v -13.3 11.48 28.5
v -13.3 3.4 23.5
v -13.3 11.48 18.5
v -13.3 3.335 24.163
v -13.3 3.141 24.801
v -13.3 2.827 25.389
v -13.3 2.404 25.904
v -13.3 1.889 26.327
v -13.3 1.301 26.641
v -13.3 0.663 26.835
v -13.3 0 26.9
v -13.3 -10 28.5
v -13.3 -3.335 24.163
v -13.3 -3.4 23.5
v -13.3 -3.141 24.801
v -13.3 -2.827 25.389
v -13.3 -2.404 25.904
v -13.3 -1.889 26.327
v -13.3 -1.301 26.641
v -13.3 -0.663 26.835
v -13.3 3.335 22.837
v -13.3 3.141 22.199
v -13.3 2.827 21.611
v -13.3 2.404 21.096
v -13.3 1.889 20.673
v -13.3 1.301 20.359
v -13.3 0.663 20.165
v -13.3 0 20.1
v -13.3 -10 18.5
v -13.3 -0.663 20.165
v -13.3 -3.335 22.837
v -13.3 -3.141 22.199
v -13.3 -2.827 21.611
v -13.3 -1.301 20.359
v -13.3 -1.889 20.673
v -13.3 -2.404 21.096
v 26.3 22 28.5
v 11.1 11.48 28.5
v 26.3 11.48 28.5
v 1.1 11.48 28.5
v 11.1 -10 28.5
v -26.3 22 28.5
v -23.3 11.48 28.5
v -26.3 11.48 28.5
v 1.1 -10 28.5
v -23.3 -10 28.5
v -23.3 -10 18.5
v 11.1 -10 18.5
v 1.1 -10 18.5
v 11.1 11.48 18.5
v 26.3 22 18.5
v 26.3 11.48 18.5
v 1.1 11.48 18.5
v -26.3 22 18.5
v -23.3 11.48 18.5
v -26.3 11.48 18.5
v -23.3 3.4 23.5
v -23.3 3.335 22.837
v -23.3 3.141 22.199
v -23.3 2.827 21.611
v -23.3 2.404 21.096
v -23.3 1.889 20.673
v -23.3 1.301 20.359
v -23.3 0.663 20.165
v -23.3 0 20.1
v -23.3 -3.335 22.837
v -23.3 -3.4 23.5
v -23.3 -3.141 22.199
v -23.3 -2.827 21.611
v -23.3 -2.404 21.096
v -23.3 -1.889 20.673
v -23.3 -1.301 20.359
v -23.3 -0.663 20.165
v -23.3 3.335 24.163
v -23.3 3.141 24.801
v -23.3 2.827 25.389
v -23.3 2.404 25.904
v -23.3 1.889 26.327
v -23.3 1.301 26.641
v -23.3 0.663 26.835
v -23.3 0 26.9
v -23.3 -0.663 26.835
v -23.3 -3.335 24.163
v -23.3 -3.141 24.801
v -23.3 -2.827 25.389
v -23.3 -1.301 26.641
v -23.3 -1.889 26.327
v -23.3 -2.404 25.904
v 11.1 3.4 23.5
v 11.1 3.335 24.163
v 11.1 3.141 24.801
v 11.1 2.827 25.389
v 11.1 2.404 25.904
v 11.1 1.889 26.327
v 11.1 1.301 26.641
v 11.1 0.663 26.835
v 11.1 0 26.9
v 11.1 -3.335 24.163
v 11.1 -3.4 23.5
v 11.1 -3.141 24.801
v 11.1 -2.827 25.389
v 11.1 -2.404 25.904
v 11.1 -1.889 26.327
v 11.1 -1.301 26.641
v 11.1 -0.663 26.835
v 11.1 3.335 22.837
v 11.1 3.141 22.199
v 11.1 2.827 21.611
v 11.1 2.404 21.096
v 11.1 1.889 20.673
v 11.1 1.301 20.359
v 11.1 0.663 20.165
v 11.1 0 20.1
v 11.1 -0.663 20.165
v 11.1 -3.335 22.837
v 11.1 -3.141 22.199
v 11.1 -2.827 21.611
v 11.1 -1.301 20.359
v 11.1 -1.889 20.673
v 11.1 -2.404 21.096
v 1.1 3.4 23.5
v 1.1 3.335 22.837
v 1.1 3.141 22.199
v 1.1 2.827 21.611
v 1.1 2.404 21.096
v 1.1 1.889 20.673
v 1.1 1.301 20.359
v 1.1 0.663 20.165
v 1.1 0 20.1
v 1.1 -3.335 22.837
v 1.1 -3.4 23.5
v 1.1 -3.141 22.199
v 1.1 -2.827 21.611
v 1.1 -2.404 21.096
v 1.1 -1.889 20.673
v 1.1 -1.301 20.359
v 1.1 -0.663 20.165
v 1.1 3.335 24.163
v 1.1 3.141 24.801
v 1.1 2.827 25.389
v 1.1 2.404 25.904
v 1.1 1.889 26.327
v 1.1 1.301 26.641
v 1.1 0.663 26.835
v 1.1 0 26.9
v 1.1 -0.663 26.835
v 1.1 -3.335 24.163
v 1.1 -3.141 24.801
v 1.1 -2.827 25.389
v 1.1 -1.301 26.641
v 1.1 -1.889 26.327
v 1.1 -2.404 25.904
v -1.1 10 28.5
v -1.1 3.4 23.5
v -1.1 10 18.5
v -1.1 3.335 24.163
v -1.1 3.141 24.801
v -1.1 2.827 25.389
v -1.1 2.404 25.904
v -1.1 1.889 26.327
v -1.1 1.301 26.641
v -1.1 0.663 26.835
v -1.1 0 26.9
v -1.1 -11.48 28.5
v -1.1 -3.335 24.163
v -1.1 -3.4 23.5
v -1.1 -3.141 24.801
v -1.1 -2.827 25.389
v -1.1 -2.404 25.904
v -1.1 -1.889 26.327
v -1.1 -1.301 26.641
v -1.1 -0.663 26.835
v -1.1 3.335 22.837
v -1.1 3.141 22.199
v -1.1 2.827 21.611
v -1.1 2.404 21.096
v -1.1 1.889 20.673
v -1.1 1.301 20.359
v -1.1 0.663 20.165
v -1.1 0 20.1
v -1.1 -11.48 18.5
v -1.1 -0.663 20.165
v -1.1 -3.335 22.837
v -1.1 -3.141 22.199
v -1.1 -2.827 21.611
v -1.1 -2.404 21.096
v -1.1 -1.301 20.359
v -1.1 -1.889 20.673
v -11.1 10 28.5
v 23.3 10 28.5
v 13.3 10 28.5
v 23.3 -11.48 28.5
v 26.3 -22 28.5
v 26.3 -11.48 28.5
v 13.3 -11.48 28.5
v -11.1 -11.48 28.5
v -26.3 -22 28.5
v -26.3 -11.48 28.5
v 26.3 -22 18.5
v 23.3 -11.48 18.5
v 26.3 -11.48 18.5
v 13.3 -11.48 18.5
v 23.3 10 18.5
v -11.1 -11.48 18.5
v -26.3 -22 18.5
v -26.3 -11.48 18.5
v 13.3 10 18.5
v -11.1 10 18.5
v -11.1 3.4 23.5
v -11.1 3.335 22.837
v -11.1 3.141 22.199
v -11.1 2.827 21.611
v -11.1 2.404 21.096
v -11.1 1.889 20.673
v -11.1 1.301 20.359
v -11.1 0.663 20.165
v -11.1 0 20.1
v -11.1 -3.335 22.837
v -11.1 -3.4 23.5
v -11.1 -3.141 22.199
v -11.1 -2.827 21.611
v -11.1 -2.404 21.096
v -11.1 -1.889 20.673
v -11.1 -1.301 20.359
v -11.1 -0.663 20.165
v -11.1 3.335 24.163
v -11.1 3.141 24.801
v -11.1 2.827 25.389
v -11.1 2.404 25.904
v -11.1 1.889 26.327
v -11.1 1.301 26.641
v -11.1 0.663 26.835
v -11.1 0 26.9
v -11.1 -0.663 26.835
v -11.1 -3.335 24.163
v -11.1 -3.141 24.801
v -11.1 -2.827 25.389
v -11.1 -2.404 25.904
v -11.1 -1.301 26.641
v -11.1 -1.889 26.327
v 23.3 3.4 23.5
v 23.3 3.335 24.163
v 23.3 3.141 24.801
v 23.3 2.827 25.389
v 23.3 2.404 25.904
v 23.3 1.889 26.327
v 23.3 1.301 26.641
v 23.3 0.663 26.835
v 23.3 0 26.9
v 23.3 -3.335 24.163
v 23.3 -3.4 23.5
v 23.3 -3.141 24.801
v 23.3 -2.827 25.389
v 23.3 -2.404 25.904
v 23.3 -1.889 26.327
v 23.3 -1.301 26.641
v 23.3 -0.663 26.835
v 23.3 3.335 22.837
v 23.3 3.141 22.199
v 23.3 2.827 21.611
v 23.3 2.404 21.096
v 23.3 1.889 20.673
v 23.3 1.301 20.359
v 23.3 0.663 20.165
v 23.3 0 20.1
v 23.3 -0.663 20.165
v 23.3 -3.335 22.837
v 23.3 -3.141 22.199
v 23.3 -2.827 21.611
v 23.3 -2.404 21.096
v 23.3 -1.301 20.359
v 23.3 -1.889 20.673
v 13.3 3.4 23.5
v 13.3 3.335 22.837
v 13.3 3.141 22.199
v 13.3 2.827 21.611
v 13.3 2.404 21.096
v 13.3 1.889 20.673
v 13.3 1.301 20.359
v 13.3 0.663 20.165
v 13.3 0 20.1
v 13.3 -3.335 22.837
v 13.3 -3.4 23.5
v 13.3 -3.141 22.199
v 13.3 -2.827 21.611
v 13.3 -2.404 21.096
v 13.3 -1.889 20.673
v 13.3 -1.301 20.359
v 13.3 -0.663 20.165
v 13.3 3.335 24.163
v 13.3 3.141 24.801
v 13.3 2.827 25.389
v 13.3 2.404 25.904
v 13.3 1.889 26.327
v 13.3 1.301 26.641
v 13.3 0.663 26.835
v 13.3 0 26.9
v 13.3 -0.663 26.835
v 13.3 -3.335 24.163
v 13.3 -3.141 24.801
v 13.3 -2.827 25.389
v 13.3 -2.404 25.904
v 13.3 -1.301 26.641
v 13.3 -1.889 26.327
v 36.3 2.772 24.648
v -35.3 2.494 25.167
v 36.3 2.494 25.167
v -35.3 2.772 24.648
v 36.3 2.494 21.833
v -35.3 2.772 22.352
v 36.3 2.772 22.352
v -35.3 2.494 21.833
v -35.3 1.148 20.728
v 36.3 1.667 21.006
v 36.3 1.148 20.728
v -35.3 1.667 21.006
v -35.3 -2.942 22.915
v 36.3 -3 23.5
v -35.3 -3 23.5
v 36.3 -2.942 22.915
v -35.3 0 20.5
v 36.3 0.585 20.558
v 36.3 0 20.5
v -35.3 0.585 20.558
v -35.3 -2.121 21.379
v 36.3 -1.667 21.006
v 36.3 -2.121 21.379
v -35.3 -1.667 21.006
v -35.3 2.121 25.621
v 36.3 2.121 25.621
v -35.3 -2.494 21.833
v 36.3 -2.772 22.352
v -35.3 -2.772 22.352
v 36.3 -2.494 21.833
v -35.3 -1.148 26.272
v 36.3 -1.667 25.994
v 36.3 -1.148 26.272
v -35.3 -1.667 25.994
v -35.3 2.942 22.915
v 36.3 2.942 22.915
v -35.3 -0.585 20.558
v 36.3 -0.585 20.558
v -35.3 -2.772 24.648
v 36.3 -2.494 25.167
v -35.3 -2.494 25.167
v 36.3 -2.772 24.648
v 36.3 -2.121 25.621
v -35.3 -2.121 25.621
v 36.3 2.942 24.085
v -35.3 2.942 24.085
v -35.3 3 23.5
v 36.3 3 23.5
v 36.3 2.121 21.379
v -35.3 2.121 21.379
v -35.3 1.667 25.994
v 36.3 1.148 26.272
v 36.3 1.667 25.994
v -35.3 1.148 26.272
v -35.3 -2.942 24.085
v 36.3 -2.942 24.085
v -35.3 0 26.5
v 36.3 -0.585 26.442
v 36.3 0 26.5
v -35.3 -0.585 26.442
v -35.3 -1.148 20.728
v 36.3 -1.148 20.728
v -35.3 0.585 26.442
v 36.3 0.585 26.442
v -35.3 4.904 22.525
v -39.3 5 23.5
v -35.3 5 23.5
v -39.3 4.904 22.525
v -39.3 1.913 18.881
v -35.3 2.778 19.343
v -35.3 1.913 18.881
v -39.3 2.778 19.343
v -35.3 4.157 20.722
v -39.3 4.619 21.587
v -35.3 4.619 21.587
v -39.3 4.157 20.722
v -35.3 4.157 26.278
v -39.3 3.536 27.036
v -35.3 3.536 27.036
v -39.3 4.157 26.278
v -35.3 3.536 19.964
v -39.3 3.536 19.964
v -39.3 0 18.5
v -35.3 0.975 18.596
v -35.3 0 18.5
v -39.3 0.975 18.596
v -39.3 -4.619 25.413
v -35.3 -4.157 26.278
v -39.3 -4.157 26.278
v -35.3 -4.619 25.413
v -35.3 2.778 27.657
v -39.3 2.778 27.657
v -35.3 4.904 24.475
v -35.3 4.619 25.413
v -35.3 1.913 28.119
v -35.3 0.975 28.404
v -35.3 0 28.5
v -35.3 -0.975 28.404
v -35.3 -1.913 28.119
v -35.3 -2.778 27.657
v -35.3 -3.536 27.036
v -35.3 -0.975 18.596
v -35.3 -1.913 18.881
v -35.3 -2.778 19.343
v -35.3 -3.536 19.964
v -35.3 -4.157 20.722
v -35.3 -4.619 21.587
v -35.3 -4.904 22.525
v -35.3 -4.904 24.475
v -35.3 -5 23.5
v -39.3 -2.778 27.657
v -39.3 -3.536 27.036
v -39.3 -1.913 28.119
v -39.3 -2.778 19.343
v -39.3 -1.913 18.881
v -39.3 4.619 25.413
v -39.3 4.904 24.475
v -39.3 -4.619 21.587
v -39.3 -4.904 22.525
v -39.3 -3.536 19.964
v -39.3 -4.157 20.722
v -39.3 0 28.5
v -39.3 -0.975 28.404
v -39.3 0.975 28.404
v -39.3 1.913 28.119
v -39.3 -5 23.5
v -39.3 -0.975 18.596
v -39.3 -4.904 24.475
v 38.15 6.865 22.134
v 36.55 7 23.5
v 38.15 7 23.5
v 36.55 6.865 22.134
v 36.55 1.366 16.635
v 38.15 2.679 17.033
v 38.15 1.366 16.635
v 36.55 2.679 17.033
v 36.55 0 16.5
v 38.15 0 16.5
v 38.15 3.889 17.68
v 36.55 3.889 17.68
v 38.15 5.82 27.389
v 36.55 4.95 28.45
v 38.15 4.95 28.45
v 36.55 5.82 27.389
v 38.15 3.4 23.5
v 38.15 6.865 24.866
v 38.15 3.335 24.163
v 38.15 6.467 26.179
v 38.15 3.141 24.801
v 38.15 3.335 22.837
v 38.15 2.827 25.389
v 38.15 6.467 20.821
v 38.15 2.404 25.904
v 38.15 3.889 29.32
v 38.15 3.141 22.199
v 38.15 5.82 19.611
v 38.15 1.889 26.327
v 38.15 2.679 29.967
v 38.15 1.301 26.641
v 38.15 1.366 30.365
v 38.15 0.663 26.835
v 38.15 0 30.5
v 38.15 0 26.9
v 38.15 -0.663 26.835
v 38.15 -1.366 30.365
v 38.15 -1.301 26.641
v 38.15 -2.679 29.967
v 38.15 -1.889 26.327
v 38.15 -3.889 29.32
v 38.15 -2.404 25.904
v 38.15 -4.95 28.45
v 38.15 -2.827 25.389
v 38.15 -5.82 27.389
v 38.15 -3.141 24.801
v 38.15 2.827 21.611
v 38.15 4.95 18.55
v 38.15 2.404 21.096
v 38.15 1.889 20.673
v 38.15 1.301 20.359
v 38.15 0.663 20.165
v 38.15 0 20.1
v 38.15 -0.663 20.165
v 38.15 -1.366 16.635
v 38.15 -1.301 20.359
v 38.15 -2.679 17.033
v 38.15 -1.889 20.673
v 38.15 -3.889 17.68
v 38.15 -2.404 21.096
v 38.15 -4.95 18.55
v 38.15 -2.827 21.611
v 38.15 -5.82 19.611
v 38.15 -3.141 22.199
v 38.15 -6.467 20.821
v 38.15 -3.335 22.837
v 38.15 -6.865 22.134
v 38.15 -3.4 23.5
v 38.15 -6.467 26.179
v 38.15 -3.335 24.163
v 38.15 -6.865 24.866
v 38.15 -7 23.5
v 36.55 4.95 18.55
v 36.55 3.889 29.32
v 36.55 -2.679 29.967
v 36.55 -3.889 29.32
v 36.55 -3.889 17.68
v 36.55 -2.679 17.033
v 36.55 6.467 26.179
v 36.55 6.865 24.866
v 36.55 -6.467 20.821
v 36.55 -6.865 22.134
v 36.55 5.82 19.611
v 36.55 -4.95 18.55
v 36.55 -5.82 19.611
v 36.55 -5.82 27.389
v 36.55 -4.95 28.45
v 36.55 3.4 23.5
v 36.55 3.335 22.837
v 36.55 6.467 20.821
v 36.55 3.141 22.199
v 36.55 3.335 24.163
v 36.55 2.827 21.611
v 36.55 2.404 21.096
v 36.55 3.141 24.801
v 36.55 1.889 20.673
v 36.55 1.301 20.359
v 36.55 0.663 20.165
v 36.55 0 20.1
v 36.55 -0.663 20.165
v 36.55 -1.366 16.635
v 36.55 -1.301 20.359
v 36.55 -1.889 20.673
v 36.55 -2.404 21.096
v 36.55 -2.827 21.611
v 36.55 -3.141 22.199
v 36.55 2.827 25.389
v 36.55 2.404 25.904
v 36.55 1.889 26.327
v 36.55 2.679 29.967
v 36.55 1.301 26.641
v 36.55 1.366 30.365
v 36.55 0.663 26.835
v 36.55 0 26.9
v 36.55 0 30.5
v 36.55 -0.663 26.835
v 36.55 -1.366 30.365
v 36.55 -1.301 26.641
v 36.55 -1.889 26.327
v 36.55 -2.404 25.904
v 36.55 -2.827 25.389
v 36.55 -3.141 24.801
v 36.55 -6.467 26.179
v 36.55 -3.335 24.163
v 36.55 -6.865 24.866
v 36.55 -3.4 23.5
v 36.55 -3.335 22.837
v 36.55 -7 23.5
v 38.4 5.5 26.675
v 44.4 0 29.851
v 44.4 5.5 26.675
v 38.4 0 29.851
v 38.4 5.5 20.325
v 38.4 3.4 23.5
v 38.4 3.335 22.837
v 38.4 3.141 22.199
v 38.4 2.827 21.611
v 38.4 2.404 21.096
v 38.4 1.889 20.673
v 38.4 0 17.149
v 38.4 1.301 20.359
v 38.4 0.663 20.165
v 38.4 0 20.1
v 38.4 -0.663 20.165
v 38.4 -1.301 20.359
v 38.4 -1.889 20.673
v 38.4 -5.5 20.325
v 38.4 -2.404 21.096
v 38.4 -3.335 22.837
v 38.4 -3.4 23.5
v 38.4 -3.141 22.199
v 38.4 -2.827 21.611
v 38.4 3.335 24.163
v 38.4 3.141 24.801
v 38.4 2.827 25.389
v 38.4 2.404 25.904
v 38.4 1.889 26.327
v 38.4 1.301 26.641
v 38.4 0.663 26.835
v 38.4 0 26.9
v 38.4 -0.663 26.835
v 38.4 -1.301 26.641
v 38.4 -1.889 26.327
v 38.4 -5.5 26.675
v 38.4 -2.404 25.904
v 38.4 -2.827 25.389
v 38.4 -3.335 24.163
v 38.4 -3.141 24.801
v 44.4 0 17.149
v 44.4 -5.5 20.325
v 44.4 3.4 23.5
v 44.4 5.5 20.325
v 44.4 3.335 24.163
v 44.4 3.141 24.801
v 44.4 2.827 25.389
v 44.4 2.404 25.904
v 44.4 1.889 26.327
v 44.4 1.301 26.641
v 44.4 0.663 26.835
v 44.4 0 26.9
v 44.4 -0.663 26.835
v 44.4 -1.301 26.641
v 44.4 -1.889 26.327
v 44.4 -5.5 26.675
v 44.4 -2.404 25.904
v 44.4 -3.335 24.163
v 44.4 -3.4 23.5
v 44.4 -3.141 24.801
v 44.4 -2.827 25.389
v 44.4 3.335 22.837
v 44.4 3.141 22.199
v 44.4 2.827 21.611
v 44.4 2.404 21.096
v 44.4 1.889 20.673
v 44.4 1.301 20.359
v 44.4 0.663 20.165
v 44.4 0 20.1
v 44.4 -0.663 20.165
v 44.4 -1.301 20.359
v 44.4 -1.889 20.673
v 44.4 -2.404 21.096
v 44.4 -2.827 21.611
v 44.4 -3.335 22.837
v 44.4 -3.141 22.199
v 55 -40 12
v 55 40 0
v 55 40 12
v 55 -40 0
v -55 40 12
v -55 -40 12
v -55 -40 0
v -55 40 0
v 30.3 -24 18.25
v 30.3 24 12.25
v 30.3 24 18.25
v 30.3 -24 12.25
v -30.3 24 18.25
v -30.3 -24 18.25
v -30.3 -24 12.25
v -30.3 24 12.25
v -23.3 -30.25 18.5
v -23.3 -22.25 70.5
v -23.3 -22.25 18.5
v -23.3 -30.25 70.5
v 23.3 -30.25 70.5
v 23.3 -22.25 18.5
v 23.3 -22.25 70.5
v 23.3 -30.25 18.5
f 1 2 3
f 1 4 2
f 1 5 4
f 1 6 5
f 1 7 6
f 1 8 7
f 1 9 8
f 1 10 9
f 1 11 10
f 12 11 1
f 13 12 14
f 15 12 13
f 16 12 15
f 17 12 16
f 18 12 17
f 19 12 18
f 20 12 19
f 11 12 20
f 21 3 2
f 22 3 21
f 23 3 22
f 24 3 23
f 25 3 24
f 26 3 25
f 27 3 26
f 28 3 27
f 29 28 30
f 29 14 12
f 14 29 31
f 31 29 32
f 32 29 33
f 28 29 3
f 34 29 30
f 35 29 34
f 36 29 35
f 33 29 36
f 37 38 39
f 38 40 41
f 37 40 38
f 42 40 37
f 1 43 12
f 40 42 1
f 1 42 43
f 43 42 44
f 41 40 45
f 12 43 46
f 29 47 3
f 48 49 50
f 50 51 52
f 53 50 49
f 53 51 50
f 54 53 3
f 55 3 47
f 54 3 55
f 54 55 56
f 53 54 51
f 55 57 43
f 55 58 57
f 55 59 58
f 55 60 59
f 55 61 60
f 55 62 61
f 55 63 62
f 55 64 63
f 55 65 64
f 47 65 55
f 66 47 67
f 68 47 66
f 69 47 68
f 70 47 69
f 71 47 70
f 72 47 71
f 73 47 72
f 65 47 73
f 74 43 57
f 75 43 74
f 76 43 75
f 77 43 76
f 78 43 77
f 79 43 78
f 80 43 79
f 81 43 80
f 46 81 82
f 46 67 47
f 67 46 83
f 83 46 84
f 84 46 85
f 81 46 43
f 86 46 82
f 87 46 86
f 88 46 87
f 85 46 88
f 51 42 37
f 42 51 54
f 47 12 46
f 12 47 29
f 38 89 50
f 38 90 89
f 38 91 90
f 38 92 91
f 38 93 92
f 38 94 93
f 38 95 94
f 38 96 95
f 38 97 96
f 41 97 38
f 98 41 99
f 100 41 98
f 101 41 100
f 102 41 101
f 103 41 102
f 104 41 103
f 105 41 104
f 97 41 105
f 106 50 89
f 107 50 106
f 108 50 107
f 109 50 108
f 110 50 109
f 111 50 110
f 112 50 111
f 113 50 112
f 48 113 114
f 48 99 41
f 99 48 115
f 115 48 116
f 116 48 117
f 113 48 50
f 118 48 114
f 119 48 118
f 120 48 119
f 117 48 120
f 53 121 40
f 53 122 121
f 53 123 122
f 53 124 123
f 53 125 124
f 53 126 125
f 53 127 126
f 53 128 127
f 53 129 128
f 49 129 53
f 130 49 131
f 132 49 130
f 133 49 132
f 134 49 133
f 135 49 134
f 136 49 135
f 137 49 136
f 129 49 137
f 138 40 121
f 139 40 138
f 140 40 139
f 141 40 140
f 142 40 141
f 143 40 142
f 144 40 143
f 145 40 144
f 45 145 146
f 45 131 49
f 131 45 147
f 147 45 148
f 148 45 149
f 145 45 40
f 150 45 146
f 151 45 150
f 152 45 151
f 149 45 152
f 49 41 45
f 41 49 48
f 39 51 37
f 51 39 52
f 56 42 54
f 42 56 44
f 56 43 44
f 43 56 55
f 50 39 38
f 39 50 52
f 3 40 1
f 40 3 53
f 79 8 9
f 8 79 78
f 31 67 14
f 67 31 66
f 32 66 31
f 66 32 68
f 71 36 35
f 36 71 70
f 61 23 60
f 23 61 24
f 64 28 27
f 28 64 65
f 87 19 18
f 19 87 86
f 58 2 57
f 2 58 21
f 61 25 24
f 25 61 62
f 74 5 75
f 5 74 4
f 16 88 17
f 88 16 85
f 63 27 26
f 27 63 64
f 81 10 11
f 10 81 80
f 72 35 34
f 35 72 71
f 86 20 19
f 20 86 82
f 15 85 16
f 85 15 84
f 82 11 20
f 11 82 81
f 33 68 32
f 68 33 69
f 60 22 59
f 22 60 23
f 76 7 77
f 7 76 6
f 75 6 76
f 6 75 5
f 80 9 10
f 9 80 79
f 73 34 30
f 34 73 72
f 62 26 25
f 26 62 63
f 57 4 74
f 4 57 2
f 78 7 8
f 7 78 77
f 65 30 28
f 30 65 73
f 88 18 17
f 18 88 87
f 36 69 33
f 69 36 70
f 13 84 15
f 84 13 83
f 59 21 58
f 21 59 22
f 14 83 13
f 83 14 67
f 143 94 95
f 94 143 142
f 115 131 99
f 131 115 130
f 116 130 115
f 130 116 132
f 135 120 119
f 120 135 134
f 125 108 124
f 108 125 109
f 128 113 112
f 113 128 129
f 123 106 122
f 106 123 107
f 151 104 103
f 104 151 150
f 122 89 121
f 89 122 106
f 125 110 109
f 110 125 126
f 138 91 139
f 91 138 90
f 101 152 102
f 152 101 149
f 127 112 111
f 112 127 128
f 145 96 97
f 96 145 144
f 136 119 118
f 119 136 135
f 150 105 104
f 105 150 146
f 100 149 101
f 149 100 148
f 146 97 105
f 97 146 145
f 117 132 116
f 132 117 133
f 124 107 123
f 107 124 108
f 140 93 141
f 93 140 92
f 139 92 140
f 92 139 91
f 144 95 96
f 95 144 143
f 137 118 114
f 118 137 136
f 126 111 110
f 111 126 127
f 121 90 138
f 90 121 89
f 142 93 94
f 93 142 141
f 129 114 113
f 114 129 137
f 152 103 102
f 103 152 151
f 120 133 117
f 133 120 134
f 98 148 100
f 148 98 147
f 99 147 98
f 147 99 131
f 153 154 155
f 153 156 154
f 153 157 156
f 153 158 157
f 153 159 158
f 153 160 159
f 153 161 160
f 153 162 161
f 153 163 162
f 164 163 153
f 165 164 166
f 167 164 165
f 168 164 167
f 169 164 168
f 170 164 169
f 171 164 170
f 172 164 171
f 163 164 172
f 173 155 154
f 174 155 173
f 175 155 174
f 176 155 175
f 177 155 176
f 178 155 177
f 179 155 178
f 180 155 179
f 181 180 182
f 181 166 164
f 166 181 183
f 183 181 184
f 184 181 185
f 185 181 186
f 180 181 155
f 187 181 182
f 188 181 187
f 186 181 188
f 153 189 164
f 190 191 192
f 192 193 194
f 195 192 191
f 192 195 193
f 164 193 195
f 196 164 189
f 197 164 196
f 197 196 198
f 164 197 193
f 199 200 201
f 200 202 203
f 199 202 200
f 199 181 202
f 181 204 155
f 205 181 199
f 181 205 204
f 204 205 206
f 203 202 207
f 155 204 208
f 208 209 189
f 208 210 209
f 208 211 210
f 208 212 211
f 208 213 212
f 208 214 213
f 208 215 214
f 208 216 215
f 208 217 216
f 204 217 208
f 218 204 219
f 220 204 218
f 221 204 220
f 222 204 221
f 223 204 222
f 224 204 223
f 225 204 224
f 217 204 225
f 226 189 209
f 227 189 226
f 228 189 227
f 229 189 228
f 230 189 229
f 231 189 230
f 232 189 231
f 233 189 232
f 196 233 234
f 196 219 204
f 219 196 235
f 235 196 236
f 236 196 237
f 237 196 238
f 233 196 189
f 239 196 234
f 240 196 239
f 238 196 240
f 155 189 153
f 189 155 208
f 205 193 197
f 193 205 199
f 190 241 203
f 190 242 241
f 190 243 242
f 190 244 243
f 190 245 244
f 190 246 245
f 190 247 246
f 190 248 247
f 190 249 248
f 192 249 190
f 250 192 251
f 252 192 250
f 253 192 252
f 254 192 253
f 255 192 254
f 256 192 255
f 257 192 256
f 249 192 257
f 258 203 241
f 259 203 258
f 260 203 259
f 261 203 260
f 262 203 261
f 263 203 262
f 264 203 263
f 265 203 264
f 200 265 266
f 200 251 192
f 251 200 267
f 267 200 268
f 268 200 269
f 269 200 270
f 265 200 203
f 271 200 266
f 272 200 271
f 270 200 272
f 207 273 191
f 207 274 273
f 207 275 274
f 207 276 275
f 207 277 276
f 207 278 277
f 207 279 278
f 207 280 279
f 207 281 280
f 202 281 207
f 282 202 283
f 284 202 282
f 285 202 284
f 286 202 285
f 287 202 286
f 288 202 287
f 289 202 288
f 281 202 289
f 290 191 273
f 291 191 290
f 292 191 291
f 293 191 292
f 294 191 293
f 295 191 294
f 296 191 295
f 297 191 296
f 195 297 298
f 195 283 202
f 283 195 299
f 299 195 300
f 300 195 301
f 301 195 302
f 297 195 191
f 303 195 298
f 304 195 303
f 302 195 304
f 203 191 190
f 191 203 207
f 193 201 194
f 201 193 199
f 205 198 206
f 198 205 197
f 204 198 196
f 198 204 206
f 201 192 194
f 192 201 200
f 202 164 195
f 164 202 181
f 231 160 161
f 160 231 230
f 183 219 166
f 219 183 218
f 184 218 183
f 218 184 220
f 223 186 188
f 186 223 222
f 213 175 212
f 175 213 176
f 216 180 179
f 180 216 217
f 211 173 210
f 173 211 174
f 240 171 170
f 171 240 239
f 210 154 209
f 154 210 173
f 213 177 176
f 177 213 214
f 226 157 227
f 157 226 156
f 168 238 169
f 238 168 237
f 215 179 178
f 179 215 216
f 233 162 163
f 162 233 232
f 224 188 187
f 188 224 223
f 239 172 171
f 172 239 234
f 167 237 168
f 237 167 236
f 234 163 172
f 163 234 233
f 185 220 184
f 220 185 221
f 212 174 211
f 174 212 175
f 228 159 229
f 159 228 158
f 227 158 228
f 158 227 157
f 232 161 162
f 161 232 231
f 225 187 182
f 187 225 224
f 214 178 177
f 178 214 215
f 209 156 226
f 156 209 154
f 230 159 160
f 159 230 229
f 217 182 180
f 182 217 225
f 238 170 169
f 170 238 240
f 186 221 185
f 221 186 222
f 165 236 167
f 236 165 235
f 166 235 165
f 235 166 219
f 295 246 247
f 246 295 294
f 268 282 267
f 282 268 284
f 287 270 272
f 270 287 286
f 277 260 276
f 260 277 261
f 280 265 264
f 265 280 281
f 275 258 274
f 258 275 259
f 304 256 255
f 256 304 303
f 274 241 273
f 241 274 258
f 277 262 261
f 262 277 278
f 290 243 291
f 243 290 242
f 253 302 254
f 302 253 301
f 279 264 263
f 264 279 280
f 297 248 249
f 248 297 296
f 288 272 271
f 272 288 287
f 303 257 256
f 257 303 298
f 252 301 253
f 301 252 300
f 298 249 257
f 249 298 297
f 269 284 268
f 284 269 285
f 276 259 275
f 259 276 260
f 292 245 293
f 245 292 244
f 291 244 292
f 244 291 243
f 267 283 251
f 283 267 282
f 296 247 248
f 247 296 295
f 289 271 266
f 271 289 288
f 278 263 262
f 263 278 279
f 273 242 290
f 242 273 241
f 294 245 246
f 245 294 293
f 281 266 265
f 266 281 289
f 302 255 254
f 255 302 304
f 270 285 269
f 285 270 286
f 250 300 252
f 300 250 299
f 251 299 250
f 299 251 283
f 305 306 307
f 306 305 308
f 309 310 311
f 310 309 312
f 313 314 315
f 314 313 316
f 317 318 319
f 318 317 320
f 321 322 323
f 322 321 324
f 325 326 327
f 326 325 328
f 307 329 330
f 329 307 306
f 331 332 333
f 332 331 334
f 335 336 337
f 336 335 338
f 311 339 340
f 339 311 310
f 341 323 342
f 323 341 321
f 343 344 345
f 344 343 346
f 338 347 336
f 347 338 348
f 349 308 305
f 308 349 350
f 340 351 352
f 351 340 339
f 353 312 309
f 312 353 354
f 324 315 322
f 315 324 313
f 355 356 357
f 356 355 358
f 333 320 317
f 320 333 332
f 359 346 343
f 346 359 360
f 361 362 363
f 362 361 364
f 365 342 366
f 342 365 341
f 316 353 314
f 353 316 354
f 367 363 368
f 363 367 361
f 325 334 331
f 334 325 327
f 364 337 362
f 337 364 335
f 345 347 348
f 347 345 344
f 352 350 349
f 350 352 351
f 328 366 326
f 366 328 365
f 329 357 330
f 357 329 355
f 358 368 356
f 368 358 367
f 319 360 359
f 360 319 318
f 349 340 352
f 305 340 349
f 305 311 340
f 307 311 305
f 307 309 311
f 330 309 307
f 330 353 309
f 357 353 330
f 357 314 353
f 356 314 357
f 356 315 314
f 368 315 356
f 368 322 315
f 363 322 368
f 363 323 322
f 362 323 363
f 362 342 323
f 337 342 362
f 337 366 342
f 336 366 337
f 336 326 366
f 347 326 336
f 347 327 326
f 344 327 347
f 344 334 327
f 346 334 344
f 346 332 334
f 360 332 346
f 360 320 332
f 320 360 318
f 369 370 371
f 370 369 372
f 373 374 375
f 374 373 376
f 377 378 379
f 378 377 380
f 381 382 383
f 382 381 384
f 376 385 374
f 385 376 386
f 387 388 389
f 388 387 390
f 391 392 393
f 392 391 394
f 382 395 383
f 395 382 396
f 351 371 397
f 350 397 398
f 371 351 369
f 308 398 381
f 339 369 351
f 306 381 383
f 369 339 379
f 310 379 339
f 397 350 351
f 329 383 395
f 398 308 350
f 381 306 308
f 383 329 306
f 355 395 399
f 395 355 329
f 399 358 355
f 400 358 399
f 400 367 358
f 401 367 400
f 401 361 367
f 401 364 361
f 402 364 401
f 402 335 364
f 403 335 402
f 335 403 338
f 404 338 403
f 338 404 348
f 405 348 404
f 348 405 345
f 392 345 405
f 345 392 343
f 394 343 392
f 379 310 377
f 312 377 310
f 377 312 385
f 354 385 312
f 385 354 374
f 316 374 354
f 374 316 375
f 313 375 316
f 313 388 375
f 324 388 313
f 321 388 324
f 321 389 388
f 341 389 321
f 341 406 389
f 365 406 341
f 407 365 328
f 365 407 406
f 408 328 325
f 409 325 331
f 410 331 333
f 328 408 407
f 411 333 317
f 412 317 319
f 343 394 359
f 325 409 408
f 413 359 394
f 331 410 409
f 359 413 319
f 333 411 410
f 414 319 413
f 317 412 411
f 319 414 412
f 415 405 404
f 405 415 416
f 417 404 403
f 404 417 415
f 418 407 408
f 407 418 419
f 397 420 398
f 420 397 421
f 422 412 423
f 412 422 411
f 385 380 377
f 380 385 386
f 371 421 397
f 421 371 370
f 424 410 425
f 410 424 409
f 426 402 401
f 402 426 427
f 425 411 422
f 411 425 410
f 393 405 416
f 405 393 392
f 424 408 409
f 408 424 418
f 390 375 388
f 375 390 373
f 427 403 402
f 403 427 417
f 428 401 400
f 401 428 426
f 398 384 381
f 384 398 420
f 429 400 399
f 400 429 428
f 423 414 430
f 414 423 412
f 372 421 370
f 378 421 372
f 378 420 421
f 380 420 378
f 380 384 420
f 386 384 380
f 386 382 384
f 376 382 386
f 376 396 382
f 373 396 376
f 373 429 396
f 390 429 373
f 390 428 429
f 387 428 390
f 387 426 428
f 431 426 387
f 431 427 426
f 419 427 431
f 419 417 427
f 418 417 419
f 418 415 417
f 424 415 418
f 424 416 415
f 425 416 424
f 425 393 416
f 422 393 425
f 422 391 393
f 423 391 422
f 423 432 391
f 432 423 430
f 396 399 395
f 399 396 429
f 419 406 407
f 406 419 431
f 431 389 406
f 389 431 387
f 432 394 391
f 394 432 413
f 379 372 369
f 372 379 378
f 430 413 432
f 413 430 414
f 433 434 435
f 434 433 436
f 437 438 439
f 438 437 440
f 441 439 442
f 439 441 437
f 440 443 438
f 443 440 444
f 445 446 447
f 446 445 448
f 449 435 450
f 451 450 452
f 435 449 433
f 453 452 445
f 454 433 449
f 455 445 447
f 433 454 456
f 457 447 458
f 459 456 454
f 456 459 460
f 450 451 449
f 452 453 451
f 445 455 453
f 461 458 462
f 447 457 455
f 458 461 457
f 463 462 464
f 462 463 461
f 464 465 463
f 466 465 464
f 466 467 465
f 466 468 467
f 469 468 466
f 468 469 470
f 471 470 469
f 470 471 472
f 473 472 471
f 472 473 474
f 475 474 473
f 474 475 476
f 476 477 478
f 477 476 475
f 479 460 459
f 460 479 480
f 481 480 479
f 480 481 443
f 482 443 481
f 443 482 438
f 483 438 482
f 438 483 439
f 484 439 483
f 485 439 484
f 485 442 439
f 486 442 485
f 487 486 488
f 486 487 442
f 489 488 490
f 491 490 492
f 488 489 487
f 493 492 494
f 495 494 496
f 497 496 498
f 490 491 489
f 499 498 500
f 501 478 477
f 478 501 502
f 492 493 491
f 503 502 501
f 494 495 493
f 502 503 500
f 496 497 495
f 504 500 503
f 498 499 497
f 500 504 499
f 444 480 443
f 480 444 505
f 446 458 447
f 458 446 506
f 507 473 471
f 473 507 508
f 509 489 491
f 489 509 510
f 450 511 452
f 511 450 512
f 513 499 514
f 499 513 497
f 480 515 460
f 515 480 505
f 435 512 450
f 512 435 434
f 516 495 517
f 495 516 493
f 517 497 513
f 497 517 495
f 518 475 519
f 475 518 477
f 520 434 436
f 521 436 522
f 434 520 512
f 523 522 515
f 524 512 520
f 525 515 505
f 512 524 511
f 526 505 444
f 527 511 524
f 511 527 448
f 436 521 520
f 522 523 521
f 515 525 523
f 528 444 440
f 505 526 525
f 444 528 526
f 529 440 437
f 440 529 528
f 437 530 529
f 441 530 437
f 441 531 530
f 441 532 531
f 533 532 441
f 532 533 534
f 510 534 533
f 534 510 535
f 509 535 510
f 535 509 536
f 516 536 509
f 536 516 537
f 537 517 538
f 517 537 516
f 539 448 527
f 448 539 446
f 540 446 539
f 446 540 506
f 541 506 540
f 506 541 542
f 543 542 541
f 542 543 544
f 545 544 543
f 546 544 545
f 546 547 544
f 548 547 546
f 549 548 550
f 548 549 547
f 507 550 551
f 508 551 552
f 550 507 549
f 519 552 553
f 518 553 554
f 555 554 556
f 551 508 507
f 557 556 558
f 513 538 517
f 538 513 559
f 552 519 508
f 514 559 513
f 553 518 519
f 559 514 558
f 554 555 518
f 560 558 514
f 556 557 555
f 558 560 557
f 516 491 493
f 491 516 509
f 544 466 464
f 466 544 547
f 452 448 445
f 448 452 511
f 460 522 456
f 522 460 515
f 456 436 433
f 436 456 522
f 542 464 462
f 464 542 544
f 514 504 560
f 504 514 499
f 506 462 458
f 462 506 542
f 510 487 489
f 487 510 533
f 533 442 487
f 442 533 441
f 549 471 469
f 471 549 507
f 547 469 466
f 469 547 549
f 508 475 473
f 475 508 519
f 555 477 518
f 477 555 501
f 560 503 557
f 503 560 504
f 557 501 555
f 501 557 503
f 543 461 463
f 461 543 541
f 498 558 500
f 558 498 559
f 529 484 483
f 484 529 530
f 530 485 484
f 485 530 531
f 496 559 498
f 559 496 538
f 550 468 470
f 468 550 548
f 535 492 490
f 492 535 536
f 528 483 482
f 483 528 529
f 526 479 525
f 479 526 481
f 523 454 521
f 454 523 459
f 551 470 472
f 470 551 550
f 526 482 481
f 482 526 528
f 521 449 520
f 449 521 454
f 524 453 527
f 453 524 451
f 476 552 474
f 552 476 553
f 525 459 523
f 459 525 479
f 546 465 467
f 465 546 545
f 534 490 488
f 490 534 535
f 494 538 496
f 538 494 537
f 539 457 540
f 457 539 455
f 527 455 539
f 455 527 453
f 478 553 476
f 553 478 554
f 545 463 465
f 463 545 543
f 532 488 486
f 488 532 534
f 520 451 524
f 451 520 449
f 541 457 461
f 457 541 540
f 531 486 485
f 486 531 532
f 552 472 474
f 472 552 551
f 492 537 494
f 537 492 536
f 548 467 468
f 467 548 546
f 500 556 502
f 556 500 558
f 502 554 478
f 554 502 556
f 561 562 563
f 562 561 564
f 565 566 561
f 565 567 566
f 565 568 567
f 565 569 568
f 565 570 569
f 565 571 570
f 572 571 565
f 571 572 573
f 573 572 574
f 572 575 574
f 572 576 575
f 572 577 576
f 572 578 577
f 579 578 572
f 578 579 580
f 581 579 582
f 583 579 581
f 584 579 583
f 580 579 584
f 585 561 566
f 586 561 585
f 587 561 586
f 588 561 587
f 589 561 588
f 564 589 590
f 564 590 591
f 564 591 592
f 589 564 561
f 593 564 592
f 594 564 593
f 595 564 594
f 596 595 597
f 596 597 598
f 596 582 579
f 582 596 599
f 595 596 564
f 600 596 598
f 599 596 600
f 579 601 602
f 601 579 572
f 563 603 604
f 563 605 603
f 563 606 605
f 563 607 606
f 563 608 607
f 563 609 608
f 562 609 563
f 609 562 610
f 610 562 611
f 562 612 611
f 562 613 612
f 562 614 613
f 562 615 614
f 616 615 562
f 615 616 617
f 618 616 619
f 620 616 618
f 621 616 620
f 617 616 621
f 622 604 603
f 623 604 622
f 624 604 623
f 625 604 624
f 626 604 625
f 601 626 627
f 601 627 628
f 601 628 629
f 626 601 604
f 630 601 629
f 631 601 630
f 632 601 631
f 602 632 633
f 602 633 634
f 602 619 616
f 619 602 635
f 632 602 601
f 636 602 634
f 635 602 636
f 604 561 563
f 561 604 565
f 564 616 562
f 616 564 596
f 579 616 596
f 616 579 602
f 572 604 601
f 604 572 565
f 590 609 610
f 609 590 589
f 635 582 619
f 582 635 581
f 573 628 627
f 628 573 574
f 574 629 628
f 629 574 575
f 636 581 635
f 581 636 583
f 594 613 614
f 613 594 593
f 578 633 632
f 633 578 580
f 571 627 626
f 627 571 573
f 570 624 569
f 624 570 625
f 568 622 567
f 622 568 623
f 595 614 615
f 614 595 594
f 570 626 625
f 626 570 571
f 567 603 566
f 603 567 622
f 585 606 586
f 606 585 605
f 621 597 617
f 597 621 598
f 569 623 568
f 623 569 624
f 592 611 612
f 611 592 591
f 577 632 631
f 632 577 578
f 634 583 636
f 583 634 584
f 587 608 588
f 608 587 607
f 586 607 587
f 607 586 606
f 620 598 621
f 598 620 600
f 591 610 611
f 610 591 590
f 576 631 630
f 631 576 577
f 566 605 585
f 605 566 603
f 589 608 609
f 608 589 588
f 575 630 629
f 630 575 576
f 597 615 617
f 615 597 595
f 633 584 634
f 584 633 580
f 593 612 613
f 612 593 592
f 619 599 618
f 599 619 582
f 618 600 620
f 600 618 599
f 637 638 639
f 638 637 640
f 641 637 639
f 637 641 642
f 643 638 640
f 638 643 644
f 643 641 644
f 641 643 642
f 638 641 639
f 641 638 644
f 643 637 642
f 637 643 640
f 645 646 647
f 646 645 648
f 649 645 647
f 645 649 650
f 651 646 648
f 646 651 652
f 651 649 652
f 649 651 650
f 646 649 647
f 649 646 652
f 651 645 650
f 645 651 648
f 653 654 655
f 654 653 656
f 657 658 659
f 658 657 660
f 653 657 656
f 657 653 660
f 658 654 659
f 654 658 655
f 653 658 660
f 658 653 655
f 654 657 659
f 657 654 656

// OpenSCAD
$fn = 32;

// ------------------------------------------------------------------------
// Comb hinge with flap: leaf 52.6 x 22 mm, pin d6, flap 52 mm
// Every part is its own module, assembly() places every instance.
// ------------------------------------------------------------------------

// --- part 1 ---
module hinge_bed() {
  difference() {
    translate([-55, -40, 0]) cube([110, 80, 12]);
  }
}

// --- part 2 ---
module hinge_riser() {
  difference() {
    translate([-30.3, -24, 0]) cube([60.6, 48, 6]);
  }
}

// --- part 3 ---
module hinge_leaf_a() {
  difference() {
    union() {
      translate([-23.3, -10, -5]) cube([10, 32, 10]);
      translate([1.1, -10, -5]) cube([10, 32, 10]);
      translate([-26.3, 11.48, -5]) cube([52.6, 10.52, 10]);
    }
    translate([-18.3, 0, 0]) rotate([0, 90, 0]) cylinder(h = 12, d = 6.8, center = true);
    translate([6.1, 0, 0]) rotate([0, 90, 0]) cylinder(h = 12, d = 6.8, center = true);
  }
}

// --- part 4 ---
module hinge_leaf_b() {
  difference() {
    union() {
      translate([-11.1, -22, -5]) cube([10, 32, 10]);
      translate([13.3, -22, -5]) cube([10, 32, 10]);
      translate([-26.3, -22, -5]) cube([52.6, 10.52, 10]);
    }
    translate([-6.1, 0, 0]) rotate([0, 90, 0]) cylinder(h = 12, d = 6.8, center = true);
    translate([18.3, 0, 0]) rotate([0, 90, 0]) cylinder(h = 12, d = 6.8, center = true);
  }
}

// --- part 5 ---
module hinge_flap() {
  difference() {
    translate([-23.3, -26, 0]) cube([46.6, 52, 8]);
  }
}

// --- part 6 ---
module hinge_pin() {
  rotate([0, 90, 0]) cylinder(h = 72.6, d = 6, center = true);
  translate([-39.3, 0, 0]) rotate([0, 90, 0]) cylinder(h = 4, d = 10);
}

// --- part 7 ---
module pin_washer() {
  difference() {
      translate([0, 0, 0]) cylinder(h = 1.6, d = 14);
      translate([0, 0, -1]) cylinder(h = 3.6, d = 6.8);
    }
}

// --- part 8 ---
module pin_nut() {
  difference() {
    linear_extrude(height = 6) polygon(points = [[6.351, 0], [3.175, 5.5], [-3.175, 5.5], [-6.351, 0], [-3.175, -5.5], [3.175, -5.5]]);
    translate([0, 0, -1]) cylinder(h = 8, d = 6.8);
  }
}

// --- assembly ---
module assembly() {
  color([0.80, 0.24, 0.20]) translate([0, 0, 0]) rotate([0, 0, 0]) hinge_bed();
  color([0.20, 0.45, 0.75]) translate([0, 0, 12.25]) rotate([0, 0, 0]) hinge_riser();
  color([0.25, 0.62, 0.32]) translate([0, 0, 23.5]) rotate([0, 0, 0]) hinge_leaf_a();
  color([0.92, 0.70, 0.18]) translate([0, 0, 23.5]) rotate([0, 0, 0]) hinge_leaf_b();
  color([0.58, 0.35, 0.70]) translate([0, -22.25, 44.5]) rotate([90, 0, 0]) hinge_flap();
  color([0.16, 0.66, 0.66]) translate([0, 0, 23.5]) rotate([0, 0, 0]) hinge_pin();
  color([0.85, 0.48, 0.18]) translate([36.55, 0, 23.5]) rotate([0, 90, 0]) pin_washer();
  color([0.55, 0.60, 0.65]) translate([38.4, 0, 23.5]) rotate([0, 90, 0]) pin_nut();
}

assembly();
